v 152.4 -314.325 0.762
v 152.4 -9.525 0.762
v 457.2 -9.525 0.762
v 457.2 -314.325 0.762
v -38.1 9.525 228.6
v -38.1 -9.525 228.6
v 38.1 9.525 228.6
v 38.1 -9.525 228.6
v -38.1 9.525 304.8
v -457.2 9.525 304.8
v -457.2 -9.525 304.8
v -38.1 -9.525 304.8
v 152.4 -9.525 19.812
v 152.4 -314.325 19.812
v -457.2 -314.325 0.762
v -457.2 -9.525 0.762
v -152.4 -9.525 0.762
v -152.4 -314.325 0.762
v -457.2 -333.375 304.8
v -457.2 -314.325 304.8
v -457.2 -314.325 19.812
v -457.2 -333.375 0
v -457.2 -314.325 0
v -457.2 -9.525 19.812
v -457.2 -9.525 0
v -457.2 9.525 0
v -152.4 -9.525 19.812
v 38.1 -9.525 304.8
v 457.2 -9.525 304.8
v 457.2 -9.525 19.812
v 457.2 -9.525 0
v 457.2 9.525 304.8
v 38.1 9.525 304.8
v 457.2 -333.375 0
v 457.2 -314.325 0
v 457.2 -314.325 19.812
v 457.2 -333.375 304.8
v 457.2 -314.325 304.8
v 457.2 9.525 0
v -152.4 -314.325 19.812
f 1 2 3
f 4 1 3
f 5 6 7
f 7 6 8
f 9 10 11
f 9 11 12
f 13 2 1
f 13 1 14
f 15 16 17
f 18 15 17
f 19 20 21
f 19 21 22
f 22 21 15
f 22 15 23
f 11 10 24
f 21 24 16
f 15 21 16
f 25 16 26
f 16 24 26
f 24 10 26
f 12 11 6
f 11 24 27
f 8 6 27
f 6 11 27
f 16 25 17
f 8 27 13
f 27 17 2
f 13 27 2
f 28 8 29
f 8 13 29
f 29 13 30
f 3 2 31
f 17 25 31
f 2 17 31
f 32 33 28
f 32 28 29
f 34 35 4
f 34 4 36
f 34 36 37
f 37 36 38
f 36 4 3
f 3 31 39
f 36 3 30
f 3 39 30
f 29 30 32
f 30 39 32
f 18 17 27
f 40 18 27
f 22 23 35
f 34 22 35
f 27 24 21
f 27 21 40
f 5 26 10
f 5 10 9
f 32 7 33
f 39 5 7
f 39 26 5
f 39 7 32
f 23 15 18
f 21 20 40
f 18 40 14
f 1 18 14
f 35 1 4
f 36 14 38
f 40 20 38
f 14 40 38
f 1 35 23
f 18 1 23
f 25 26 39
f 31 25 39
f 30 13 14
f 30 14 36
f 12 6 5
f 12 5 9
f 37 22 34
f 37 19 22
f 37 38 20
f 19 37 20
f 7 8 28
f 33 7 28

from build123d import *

# Parameters (mm, degrees)
F0_W     = 914.4
F0_H     = 19.05
F1_DEPTH = 304.8
F2_W     = 76.2
F2_H     = 76.2
F3_DEPTH = 19.05
F4_W     = 304.8
F4_H     = 19.05
F5_DEPTH = 304.8
F6_W     = 304.8
F6_H     = 19.05
F7_DEPTH = 304.8
F8_W     = 304.8
F8_H     = 19.05
F9_DEPTH = 19.05


with BuildPart() as f1:
    # F0 (on Top) → F1 (new body)
    with BuildSketch(Plane.XY):
        Rectangle(F0_W, F0_H)
    extrude(amount=F1_DEPTH)

    # F2 (on face) → F3 (cut)
    with BuildSketch(Plane.XZ.offset(9.525)):
        with Locations((0, 266.7)):
            Rectangle(F2_W, F2_H)
    extrude(amount=-F3_DEPTH, mode=Mode.SUBTRACT)

    # F4 (on face) → F5 (join)
    with BuildSketch(Plane.XZ.offset(9.525)):
        with Locations((-304.8, 10.287)):
            Rectangle(F4_W, F4_H)
    extrude(amount=F5_DEPTH)

    # F6 (on face) → F7 (join)
    with BuildSketch(Plane.XZ.offset(9.525)):
        with Locations((304.8, 10.287)):
            Rectangle(F6_W, F6_H)
    extrude(amount=F7_DEPTH)

    # F8 (on face) → F9 (join)
    with BuildSketch(Plane.XZ.offset(314.325)):
        Polygon((-152.4, 0.762), (-457.2, 0.762), (-457.2, 0), (457.2, 0), (457.2, 304.8), (-457.2, 304.8), (-457.2, 19.812), (-152.4, 19.812), align=None)
        with Locations((-304.8, 10.287)):
            Rectangle(F8_W, F8_H)
    extrude(amount=F9_DEPTH)


solid = f1.part
